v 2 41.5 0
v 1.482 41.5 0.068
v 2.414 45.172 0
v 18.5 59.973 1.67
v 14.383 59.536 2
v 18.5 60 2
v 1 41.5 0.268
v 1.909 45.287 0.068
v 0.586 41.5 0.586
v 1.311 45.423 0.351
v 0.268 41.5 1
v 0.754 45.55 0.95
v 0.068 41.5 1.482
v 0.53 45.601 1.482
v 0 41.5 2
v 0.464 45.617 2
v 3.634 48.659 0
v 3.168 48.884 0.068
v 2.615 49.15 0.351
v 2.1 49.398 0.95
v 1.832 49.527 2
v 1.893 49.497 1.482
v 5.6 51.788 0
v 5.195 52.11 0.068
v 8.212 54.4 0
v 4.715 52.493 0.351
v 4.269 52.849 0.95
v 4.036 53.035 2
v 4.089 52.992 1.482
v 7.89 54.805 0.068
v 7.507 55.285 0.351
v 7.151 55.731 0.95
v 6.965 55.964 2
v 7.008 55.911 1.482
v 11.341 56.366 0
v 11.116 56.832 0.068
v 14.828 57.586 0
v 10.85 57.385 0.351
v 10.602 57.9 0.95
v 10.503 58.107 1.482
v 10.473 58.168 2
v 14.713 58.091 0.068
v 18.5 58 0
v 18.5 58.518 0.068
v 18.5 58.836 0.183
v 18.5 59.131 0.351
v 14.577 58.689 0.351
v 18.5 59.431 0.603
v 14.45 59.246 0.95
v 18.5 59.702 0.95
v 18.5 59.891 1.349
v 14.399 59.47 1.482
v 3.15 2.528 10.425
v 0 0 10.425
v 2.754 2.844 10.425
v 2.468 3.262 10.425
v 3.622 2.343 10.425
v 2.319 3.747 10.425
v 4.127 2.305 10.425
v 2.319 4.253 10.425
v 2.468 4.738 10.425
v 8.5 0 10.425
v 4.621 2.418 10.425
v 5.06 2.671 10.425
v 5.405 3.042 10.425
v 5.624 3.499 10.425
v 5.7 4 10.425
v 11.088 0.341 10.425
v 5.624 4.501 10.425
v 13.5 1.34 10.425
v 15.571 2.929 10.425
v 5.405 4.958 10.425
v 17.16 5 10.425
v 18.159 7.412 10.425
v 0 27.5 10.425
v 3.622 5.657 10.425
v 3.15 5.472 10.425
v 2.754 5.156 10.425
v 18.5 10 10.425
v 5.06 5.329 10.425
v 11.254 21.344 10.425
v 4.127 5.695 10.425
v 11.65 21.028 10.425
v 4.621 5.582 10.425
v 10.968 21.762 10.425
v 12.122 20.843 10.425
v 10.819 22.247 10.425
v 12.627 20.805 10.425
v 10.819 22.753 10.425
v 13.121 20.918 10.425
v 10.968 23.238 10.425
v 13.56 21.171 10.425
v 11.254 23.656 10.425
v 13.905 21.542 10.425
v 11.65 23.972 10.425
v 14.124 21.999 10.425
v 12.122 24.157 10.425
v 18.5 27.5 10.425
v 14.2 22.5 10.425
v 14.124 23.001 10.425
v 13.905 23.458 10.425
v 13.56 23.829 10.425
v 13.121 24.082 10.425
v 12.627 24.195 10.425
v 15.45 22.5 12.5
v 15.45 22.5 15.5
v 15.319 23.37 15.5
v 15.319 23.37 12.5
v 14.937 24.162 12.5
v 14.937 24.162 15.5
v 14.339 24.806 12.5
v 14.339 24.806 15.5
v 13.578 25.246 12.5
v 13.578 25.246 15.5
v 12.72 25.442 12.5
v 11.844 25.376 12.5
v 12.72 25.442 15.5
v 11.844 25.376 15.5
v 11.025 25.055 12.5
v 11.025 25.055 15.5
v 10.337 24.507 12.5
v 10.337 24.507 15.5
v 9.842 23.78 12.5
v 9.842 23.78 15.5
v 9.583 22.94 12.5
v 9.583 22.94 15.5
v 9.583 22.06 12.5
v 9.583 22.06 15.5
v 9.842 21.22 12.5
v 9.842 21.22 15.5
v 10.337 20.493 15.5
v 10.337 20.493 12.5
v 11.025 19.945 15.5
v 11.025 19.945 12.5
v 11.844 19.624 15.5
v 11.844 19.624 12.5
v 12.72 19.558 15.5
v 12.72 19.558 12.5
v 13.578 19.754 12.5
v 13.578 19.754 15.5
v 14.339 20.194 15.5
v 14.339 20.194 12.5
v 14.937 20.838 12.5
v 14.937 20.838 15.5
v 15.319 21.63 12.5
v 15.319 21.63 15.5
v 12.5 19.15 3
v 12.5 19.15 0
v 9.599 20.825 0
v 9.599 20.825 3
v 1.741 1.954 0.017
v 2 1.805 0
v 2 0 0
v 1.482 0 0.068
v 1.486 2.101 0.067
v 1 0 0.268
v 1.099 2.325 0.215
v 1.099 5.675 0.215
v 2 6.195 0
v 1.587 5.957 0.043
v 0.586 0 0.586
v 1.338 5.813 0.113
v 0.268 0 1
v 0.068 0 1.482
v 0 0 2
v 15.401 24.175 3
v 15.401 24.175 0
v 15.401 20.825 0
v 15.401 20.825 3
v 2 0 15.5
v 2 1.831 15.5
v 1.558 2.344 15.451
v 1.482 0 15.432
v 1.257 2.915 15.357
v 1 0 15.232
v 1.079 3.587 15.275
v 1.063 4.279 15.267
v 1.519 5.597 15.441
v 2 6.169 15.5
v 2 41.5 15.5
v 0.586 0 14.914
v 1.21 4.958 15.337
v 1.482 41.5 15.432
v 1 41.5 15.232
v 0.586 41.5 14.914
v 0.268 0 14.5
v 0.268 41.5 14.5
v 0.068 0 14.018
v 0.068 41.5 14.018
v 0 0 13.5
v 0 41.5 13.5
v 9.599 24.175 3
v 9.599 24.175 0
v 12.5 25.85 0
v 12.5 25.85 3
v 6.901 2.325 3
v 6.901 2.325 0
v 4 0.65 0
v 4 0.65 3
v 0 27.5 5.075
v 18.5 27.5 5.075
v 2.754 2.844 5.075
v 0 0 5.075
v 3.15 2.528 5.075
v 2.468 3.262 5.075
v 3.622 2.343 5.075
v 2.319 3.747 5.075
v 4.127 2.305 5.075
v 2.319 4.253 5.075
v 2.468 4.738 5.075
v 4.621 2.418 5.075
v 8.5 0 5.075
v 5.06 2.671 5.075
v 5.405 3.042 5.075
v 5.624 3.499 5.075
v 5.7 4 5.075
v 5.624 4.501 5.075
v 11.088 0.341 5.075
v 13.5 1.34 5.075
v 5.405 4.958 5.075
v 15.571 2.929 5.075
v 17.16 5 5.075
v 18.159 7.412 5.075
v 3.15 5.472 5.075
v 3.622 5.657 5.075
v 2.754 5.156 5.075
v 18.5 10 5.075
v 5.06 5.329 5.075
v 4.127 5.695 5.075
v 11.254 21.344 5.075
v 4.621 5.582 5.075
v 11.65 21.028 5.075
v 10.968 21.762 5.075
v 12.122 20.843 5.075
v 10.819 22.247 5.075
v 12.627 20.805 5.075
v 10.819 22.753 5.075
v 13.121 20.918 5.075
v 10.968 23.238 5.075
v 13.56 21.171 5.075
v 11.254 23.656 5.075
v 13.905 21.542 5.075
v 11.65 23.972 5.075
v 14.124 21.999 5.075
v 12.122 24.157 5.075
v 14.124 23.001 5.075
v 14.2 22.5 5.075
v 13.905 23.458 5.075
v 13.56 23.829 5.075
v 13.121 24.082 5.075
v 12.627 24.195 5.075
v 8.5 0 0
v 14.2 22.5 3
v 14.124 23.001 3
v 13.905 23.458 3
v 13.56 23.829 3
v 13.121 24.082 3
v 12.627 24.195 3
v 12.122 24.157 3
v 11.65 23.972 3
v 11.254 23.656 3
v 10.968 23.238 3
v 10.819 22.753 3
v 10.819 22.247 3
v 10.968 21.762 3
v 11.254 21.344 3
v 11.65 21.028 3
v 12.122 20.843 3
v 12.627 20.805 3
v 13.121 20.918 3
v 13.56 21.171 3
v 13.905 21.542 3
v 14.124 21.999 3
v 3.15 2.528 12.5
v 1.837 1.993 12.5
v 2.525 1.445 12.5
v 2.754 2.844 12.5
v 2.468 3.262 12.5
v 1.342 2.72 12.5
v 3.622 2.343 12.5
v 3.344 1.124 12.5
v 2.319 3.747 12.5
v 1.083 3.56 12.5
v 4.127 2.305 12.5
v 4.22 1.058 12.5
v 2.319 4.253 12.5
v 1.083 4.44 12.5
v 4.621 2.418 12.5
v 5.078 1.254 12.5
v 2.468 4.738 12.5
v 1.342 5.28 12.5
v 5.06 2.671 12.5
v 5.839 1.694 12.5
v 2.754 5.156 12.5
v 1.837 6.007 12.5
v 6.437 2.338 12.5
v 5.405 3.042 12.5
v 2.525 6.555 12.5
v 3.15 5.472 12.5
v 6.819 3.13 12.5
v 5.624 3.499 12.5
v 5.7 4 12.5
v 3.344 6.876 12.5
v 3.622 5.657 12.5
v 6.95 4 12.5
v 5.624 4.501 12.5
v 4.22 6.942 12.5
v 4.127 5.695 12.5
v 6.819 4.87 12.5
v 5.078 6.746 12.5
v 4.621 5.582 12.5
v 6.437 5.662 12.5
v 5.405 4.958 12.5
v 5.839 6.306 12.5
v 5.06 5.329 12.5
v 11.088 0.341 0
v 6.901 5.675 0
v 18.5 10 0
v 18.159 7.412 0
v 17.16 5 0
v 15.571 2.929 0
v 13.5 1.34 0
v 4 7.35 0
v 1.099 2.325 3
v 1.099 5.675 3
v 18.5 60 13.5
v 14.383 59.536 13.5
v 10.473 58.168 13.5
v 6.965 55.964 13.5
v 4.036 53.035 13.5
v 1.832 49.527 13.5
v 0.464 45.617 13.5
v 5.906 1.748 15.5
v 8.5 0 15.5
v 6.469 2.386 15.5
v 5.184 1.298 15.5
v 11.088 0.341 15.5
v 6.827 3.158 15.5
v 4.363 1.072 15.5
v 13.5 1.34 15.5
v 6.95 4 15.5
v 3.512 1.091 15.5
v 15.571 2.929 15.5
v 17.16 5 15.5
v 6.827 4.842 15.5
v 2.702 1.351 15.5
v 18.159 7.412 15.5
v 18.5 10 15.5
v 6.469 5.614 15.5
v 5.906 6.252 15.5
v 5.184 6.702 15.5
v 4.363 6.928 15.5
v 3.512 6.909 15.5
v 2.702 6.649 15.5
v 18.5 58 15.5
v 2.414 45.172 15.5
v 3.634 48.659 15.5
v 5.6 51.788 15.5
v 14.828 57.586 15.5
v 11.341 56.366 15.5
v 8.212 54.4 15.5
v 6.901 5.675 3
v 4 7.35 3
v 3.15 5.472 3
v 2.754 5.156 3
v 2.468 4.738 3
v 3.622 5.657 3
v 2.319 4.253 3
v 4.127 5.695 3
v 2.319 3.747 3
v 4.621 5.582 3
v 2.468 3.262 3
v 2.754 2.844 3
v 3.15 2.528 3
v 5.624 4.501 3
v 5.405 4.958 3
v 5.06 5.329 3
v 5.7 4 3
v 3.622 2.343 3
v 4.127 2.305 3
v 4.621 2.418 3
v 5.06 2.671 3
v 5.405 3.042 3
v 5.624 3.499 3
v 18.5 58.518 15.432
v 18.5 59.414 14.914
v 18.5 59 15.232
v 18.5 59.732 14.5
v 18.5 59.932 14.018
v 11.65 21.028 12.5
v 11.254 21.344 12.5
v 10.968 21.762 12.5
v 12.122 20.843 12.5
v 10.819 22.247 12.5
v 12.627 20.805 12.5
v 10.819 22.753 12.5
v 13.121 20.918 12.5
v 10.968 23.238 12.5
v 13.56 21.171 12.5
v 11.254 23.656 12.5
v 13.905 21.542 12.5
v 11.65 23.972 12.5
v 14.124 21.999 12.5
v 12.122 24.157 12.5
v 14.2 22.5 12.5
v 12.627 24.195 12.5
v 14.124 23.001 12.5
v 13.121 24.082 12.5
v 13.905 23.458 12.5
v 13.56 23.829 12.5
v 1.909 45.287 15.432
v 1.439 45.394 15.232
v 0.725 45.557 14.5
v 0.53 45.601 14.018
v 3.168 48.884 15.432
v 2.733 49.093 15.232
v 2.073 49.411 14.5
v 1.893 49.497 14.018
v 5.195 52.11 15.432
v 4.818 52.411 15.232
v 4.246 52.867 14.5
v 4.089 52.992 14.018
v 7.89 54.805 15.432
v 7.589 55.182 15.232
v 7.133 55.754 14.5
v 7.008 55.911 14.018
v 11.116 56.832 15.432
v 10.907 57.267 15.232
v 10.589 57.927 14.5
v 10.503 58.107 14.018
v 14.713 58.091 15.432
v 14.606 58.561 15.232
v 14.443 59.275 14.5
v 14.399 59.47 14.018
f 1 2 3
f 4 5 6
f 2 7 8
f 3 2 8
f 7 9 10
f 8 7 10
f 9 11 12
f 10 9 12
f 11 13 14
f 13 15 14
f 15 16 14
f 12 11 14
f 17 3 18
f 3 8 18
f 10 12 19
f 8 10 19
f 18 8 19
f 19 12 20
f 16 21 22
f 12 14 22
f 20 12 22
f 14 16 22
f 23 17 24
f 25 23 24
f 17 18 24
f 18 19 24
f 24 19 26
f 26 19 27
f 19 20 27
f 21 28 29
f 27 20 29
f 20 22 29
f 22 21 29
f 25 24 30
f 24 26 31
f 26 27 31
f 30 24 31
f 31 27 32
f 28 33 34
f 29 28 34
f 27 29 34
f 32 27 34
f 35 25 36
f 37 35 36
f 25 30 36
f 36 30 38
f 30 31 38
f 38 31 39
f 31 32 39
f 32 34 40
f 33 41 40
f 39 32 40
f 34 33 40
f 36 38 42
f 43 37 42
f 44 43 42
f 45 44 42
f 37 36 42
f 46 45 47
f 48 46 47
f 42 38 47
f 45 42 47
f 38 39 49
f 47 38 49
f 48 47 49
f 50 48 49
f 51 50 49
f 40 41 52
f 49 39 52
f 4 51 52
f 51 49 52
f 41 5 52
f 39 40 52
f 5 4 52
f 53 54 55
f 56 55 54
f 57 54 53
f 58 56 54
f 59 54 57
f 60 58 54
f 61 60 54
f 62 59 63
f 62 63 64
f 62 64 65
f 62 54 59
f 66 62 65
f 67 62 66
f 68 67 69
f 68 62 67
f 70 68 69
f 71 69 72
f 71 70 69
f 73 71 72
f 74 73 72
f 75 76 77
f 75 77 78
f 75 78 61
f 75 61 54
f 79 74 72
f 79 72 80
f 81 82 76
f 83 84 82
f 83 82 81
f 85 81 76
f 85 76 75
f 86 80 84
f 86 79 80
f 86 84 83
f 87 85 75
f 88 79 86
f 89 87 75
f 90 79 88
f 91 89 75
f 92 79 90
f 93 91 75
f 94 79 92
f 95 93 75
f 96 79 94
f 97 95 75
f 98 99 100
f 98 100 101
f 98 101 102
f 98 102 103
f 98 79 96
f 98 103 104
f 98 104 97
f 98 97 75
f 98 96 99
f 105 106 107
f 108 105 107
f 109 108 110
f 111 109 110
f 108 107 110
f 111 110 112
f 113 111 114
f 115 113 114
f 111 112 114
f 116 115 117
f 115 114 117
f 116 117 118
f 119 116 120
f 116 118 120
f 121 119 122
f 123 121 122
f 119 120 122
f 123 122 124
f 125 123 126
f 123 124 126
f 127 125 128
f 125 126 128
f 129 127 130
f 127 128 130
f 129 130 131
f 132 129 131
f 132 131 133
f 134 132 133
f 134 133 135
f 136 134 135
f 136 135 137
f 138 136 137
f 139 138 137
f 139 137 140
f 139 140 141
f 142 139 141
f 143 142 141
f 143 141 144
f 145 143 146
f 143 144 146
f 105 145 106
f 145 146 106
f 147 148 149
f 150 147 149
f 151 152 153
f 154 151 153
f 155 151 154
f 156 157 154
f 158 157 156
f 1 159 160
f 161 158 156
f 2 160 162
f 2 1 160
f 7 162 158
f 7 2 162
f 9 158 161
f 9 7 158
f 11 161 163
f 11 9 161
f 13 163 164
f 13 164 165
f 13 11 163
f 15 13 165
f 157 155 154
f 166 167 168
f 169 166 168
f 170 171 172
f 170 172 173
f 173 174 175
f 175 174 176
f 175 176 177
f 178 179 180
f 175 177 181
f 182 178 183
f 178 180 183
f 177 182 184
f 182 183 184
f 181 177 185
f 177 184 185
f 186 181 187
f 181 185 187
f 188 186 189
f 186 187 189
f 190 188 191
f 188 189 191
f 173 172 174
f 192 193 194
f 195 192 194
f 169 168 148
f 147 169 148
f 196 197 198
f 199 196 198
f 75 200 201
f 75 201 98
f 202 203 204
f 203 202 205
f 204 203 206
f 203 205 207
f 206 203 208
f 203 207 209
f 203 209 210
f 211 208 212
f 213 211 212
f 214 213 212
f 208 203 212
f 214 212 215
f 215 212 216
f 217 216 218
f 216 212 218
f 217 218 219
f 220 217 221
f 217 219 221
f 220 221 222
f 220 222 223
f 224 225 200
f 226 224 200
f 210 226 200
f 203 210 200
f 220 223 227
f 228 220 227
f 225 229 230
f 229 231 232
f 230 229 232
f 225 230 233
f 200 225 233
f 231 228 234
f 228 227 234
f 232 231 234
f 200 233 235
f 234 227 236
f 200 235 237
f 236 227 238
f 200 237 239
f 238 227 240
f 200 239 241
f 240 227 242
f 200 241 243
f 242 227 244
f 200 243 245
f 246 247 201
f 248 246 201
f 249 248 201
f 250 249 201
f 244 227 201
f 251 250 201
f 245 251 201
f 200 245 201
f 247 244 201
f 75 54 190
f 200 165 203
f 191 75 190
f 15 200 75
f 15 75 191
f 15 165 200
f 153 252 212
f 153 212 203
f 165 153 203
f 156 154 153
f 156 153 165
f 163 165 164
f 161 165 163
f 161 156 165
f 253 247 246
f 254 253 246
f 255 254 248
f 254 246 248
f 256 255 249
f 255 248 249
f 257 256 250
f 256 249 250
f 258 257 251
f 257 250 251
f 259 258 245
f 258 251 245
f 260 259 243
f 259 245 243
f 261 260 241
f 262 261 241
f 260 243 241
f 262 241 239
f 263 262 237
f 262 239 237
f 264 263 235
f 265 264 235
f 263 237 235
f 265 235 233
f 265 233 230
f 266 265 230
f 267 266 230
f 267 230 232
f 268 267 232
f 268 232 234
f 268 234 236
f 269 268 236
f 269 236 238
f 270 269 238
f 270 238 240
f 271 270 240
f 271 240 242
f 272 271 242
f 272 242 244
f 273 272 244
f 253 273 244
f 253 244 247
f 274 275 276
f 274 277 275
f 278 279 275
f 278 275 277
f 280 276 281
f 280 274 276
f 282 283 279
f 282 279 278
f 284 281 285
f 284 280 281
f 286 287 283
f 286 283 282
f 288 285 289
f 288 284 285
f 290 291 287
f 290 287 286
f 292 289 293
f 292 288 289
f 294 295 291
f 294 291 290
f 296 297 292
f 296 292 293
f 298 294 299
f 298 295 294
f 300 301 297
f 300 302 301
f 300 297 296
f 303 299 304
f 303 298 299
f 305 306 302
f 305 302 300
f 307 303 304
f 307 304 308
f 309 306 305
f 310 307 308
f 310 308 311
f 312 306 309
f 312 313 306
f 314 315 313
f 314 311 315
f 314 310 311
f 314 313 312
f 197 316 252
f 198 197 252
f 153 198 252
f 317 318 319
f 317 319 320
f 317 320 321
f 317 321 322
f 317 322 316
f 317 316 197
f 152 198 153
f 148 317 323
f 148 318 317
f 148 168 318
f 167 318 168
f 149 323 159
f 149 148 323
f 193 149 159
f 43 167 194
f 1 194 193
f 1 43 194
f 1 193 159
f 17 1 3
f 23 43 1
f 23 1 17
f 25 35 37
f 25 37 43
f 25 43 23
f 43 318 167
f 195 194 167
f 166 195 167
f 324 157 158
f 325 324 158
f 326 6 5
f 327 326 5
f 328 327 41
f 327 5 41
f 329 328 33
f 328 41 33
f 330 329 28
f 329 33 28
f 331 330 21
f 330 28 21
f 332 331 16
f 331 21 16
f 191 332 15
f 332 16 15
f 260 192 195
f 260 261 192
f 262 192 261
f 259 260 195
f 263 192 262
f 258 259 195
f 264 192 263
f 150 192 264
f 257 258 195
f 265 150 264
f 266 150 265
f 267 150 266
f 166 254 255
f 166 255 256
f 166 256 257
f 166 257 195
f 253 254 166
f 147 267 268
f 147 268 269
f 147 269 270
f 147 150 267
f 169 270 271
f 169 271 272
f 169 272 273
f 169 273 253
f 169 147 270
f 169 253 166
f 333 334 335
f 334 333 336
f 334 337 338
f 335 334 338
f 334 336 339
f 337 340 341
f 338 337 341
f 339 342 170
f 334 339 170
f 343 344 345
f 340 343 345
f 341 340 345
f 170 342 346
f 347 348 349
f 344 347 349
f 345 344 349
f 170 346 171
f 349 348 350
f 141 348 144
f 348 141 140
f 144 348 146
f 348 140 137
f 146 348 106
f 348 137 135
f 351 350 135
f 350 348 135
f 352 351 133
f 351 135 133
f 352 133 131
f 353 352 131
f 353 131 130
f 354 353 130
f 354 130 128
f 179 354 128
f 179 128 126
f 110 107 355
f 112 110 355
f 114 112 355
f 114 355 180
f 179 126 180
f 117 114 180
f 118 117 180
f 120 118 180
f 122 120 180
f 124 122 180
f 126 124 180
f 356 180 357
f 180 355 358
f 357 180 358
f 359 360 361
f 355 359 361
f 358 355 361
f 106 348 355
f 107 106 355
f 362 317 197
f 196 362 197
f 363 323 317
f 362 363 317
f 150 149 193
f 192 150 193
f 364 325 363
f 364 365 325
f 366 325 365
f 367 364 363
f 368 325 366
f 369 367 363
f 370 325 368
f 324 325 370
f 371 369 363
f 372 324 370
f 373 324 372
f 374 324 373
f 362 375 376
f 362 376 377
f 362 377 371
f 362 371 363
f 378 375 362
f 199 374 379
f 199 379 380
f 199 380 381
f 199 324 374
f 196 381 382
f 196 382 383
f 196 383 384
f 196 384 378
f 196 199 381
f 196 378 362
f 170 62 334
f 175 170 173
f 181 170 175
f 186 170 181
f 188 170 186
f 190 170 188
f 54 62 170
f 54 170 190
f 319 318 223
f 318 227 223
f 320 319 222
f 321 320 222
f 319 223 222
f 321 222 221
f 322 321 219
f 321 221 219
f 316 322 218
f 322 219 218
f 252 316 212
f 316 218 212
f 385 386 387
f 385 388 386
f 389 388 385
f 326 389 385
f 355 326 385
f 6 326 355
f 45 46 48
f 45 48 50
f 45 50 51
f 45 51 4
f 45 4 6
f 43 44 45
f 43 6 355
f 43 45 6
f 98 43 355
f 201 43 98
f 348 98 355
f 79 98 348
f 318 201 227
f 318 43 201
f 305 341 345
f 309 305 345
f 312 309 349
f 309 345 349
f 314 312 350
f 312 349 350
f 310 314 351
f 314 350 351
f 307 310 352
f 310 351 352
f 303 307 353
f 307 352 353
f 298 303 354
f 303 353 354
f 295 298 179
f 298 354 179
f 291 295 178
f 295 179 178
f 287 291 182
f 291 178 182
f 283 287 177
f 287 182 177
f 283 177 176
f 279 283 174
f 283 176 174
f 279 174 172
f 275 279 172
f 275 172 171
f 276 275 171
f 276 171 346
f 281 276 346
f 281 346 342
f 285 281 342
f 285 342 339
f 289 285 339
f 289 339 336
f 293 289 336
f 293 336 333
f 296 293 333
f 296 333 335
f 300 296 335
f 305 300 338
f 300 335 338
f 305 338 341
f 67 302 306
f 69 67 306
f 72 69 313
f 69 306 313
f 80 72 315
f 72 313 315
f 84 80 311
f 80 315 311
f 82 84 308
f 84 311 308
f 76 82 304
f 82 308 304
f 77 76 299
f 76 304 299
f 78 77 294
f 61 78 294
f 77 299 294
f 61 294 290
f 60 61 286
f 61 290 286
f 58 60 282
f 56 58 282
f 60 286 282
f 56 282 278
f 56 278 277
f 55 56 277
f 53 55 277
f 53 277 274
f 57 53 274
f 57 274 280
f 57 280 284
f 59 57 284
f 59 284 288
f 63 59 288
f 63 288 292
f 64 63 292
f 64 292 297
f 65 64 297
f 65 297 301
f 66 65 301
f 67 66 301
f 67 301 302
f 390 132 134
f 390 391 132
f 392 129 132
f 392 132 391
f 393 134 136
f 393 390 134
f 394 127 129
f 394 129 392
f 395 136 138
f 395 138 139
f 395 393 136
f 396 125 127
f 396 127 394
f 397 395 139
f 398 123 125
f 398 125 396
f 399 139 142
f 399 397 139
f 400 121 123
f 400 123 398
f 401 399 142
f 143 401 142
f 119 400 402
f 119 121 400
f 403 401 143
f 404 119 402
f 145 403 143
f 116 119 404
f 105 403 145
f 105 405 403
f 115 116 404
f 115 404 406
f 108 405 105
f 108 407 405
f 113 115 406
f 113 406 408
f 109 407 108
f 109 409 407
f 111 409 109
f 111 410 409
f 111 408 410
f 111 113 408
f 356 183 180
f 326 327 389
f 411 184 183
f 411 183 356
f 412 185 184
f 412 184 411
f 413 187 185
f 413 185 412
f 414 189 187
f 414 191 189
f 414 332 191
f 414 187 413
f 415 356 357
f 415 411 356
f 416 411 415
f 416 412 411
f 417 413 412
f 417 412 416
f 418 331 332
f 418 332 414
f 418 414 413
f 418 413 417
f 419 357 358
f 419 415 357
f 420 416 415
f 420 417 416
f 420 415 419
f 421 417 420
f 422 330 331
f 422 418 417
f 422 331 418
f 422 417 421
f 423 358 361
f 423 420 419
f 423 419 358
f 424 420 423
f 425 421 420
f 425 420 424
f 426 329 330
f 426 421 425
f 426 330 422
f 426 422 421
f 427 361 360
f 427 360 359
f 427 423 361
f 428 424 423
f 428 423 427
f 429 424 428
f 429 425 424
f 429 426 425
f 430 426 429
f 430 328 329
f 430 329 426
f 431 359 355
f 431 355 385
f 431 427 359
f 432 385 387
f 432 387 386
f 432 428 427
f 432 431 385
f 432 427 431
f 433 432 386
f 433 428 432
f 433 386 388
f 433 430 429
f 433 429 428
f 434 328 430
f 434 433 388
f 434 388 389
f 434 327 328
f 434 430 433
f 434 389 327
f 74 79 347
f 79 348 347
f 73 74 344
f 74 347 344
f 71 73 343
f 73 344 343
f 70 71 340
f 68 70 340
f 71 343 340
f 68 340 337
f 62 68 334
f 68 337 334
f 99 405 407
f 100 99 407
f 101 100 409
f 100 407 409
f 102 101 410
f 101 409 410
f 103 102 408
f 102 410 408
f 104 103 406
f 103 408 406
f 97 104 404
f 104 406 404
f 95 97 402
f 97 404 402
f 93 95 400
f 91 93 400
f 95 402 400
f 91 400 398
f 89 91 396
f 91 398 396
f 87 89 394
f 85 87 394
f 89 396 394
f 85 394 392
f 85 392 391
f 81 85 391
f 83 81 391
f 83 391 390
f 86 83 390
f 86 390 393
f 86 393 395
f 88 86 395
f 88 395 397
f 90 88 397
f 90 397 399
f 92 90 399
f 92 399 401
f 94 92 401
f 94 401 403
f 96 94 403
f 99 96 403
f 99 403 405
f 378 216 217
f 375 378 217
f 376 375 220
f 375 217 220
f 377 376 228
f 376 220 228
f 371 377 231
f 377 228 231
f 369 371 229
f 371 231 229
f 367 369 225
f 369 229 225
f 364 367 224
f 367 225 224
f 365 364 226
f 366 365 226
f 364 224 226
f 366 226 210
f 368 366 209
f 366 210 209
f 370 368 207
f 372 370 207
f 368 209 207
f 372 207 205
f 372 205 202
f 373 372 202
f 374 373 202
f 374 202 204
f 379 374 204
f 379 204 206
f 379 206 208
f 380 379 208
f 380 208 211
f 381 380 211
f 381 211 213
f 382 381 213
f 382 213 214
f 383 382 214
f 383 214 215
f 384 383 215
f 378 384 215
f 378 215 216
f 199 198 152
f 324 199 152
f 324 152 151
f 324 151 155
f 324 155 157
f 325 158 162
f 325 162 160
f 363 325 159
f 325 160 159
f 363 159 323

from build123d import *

# Parameters (mm, degrees)
PAD_DEPTH       = 15.5
SKETCH001_W     = 27.5
SKETCH001_H     = 5.35
POCKET_DEPTH    = 18.501
SKETCH002_R     = 1.7
POCKET001_DEPTH = 15.501
FILLET_R        = 10
FILLET001_R     = 2
SKETCH003_R     = 2.95
POCKET002_DEPTH = 3
POCKET003_DEPTH = 3


with BuildPart() as part:
    # Sketch → Pad (new body)
    with BuildSketch(Plane.XY):
        with BuildLine():
            Line((18.5, 60), (18.5, 0))
            Line((18.5, 0), (0, 0))
            Line((0, 0), (0, 41.5))
            ThreePointArc((18.5, 60), (5.418525, 54.581475), (0, 41.5))
        make_face()
    extrude(amount=PAD_DEPTH)

    # Sketch001 (on Face1 of Pad) → Pocket (cut, through all)
    with BuildSketch(Plane.YZ.offset(18.5)):
        with Locations((13.75, 7.75)):
            Rectangle(SKETCH001_W, SKETCH001_H)
    extrude(amount=-POCKET_DEPTH, mode=Mode.SUBTRACT)

    # Sketch002 (on Face8 of Pocket) → Pocket001 (cut, through all)
    with BuildSketch(Plane.XY.offset(15.5)):
        with Locations((4, 4)):
            Circle(SKETCH002_R)
        with Locations((12.5, 22.5)):
            Circle(SKETCH002_R)
    extrude(amount=-POCKET001_DEPTH, mode=Mode.SUBTRACT)

    # Fillet
    fillet_edges = [part.edges().sort_by_distance(p)[0] for p in [
        (18.5, 0, 12.9625),
        (18.5, 0, 2.5375),
    ]]
    fillet(fillet_edges, radius=FILLET_R)

    # Fillet001
    fillet001_edges = [part.edges().sort_by_distance(p)[0] for p in [
        (0, 20.75, 15.5),
        (0, 20.75, 0),
    ]]
    fillet(fillet001_edges, radius=FILLET001_R)

    # Sketch003 (on Face9 of Fillet001) → Pocket002 (cut)
    with BuildSketch(Plane.XY.offset(15.5)):
        with Locations((12.5, 22.5)):
            Circle(SKETCH003_R)
        with Locations((4, 4)):
            Circle(SKETCH003_R)
    extrude(amount=-POCKET002_DEPTH, mode=Mode.SUBTRACT)

    # Sketch004 (on Face2 of Pocket002) → Pocket003 (cut)
    with BuildSketch(Plane(origin=(0, 0, 0), x_dir=(1, 0, 0), z_dir=(0, 0, -1))):
        Polygon((12.5, -25.85), (15.401185, -24.175), (15.401185, -20.825), (12.5, -19.15), (9.598815, -20.825), (9.598815, -24.175), align=None)
        Polygon((4, -7.35), (6.901185, -5.675), (6.901185, -2.325), (4, -0.65), (1.098815, -2.325), (1.098815, -5.675), align=None)
    extrude(amount=-POCKET003_DEPTH, mode=Mode.SUBTRACT)


solid = part.part
